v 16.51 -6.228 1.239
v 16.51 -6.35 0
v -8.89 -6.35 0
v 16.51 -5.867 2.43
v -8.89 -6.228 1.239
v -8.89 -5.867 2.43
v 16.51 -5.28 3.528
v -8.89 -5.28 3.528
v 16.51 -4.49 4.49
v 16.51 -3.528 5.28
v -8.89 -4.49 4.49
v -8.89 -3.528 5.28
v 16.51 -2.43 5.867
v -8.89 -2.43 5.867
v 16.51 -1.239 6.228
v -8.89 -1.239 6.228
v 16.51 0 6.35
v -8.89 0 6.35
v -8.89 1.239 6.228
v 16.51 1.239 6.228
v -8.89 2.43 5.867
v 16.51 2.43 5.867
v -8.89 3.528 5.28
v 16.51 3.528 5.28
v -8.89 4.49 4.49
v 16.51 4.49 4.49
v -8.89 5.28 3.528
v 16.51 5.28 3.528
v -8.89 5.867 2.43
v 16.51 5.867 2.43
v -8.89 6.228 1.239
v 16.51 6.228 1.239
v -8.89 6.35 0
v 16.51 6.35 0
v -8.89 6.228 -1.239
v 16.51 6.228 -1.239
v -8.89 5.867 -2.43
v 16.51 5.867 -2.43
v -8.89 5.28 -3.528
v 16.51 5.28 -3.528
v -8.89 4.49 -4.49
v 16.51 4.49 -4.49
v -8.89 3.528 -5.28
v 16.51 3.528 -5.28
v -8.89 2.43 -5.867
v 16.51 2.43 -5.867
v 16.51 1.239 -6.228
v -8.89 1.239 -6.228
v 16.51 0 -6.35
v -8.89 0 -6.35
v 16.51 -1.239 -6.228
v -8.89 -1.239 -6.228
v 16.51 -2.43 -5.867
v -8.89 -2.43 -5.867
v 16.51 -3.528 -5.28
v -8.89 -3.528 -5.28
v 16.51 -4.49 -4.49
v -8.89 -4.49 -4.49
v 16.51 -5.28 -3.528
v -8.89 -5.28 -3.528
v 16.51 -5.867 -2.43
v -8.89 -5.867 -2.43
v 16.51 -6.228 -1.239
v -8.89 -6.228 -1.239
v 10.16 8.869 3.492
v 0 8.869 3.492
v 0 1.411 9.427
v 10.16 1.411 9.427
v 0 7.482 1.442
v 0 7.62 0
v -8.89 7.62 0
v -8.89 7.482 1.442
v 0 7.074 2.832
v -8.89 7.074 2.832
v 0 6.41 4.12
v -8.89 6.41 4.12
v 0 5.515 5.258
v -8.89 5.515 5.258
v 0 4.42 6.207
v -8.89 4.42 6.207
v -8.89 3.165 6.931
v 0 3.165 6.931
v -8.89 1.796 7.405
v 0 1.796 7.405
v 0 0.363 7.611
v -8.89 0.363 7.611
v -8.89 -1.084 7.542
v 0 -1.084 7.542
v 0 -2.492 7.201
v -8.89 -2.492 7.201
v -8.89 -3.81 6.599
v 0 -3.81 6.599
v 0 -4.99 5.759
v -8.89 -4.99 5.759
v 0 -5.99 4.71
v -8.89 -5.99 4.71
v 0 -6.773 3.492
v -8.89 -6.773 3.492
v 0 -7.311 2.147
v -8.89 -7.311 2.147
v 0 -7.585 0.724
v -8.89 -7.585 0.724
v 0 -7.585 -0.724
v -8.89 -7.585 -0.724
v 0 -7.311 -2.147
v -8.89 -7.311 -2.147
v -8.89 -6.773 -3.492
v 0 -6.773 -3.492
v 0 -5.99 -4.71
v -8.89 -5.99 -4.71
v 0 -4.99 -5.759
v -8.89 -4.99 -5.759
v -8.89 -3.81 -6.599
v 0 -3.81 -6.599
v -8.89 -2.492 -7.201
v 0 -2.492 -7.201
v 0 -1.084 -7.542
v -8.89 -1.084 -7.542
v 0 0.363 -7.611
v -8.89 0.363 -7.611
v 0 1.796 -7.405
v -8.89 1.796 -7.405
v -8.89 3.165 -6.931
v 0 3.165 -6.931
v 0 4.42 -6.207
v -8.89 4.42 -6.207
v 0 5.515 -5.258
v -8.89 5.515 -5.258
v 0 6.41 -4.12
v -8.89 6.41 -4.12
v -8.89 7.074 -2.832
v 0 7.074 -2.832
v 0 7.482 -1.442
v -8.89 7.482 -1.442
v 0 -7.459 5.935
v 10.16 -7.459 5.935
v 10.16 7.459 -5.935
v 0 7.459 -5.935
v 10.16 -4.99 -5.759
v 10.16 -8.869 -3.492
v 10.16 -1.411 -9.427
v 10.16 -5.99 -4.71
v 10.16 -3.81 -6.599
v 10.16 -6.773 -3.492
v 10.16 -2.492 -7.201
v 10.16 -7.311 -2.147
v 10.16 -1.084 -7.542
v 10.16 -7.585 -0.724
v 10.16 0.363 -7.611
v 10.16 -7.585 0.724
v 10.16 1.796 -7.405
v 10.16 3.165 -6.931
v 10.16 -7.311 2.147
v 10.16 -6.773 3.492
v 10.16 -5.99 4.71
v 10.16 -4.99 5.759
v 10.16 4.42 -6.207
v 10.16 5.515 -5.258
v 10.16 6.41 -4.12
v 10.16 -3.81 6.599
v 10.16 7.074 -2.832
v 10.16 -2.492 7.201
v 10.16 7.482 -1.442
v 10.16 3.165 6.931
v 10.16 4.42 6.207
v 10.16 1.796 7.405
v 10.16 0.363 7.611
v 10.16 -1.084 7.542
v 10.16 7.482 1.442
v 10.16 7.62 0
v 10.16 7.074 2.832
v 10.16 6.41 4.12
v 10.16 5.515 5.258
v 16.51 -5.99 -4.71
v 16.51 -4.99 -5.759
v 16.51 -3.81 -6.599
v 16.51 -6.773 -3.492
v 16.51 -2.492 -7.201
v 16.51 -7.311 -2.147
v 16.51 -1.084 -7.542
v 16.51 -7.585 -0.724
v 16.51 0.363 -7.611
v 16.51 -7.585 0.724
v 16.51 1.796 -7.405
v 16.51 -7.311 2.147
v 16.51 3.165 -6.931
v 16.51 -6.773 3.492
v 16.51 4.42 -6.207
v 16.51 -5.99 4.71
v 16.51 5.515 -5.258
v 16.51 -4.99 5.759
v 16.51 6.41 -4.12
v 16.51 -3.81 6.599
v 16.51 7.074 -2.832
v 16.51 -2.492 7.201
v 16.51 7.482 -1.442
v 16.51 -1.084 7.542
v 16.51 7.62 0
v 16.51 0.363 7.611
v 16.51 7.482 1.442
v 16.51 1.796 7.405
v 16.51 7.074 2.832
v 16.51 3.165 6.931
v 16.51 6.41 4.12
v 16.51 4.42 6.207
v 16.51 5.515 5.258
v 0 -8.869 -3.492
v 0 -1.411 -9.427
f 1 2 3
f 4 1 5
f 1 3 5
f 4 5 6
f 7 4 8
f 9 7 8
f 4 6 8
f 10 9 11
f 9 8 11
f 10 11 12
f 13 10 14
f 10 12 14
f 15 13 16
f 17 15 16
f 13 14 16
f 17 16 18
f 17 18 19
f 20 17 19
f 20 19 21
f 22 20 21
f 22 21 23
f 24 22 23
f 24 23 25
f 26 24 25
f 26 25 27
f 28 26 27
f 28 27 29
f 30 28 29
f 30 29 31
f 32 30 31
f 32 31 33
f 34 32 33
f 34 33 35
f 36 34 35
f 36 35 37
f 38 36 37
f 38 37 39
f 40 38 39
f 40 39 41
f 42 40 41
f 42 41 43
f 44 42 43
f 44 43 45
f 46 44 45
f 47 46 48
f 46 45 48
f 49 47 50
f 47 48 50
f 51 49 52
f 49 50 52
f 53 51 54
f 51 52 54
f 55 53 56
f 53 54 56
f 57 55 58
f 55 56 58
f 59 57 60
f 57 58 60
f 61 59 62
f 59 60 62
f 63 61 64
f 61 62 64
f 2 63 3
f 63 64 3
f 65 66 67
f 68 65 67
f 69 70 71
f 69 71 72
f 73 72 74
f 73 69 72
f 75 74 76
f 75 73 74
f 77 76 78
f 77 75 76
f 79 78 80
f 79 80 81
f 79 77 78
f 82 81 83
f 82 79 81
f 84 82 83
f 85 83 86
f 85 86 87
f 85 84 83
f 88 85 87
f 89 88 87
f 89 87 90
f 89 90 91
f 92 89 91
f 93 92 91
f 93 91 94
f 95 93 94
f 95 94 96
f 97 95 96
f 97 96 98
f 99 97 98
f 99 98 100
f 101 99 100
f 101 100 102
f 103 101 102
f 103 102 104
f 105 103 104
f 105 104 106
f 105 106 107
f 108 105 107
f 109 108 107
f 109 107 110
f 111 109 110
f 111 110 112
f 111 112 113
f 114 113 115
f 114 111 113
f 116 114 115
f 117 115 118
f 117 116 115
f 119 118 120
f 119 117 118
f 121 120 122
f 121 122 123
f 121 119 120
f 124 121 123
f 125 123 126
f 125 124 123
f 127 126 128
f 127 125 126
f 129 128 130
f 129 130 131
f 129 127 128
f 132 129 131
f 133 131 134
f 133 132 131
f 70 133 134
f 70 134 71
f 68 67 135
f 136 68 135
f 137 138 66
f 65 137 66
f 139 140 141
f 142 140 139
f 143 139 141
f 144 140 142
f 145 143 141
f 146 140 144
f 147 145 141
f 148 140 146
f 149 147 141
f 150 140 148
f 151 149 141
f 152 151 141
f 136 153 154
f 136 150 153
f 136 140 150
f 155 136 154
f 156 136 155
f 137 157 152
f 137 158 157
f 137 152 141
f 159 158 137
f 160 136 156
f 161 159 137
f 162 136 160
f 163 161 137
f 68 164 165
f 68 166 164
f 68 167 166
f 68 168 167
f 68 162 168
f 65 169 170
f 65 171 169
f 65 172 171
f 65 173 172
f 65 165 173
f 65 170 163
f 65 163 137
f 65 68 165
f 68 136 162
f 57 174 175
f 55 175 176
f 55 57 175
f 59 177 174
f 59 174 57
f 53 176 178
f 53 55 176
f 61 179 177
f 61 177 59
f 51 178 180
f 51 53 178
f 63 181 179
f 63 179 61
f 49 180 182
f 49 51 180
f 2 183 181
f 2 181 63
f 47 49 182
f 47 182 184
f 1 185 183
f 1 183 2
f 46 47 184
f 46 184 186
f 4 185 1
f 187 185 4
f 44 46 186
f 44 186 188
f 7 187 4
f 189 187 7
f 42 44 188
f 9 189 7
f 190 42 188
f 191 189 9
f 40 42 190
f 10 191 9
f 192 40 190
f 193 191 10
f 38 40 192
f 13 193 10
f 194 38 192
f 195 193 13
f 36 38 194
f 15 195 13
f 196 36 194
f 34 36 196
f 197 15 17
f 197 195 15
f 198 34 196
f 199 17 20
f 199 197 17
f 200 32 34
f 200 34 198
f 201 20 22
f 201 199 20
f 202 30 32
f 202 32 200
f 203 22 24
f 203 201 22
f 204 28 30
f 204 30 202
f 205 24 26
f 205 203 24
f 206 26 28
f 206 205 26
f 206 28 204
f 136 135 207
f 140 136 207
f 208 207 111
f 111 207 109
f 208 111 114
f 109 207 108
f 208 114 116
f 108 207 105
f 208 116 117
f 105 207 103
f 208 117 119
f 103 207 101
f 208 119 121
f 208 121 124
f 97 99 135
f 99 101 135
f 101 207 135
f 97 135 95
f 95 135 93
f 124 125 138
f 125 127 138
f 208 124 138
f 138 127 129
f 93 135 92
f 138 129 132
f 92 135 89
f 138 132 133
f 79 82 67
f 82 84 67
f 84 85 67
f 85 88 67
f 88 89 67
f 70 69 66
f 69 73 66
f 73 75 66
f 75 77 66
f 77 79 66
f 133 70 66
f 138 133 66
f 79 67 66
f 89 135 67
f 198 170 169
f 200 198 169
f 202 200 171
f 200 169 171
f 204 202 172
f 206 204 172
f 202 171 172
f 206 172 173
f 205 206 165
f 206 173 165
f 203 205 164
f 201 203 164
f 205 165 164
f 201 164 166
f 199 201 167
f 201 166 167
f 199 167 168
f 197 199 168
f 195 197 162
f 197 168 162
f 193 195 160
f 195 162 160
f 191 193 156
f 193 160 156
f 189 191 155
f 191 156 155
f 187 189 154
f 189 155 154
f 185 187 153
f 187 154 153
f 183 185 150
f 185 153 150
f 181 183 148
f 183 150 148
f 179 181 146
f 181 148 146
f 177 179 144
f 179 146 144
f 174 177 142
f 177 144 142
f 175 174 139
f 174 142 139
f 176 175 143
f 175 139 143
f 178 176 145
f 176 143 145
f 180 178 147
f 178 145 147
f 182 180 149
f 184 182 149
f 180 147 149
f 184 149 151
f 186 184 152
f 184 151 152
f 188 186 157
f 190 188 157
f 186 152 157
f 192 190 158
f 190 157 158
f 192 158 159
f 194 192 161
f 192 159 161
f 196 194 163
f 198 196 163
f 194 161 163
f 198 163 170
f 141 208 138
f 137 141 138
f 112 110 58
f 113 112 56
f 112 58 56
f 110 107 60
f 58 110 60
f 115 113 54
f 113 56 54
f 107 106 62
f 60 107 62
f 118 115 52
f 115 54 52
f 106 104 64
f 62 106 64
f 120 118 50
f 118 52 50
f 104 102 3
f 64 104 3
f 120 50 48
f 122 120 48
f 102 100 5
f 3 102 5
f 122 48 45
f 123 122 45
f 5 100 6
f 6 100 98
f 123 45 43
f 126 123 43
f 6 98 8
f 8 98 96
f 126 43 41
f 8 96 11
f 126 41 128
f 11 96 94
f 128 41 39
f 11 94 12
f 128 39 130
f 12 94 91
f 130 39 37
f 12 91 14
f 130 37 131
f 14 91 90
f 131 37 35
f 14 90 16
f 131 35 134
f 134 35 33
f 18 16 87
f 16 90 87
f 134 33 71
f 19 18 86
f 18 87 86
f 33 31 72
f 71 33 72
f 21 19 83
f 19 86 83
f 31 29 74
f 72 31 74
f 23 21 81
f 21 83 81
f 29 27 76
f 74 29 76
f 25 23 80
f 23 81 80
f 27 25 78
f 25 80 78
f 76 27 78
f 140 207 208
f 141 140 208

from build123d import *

# Parameters (mm, degrees)
F1_DEPTH      = 10.16
F2_R          = 7.62
F3_DEPTH      = 6.35
F3_DEPTH_BACK = 19.05
F4_R          = 6.35
F5_DEPTH      = 25.401


with BuildPart() as f1:
    # F0 (on Right) → F1 (new body)
    with BuildSketch(Plane.YZ):
        Polygon((1.410603, 9.427101), (-7.458808, 5.935168), (-8.86941, -3.491933), (-1.410603, -9.427101), (7.458808, -5.935168), (8.86941, 3.491933), align=None)
    extrude(amount=F1_DEPTH)

    # F2 (on face) → F3 (join, two sides)
    with BuildSketch(Plane.YZ.offset(10.16)) as f3_sk:
        Circle(F2_R)
    extrude(amount=F3_DEPTH)
    extrude(f3_sk.sketch, amount=-F3_DEPTH_BACK)

    # F4 (on face) → F5 (cut, through all)
    with BuildSketch(Plane(origin=(-8.89, 0, 0), x_dir=(0, -1, 0), z_dir=(-1, 0, 0))):
        Circle(F4_R)
    extrude(amount=-F5_DEPTH, mode=Mode.SUBTRACT)


solid = f1.part
